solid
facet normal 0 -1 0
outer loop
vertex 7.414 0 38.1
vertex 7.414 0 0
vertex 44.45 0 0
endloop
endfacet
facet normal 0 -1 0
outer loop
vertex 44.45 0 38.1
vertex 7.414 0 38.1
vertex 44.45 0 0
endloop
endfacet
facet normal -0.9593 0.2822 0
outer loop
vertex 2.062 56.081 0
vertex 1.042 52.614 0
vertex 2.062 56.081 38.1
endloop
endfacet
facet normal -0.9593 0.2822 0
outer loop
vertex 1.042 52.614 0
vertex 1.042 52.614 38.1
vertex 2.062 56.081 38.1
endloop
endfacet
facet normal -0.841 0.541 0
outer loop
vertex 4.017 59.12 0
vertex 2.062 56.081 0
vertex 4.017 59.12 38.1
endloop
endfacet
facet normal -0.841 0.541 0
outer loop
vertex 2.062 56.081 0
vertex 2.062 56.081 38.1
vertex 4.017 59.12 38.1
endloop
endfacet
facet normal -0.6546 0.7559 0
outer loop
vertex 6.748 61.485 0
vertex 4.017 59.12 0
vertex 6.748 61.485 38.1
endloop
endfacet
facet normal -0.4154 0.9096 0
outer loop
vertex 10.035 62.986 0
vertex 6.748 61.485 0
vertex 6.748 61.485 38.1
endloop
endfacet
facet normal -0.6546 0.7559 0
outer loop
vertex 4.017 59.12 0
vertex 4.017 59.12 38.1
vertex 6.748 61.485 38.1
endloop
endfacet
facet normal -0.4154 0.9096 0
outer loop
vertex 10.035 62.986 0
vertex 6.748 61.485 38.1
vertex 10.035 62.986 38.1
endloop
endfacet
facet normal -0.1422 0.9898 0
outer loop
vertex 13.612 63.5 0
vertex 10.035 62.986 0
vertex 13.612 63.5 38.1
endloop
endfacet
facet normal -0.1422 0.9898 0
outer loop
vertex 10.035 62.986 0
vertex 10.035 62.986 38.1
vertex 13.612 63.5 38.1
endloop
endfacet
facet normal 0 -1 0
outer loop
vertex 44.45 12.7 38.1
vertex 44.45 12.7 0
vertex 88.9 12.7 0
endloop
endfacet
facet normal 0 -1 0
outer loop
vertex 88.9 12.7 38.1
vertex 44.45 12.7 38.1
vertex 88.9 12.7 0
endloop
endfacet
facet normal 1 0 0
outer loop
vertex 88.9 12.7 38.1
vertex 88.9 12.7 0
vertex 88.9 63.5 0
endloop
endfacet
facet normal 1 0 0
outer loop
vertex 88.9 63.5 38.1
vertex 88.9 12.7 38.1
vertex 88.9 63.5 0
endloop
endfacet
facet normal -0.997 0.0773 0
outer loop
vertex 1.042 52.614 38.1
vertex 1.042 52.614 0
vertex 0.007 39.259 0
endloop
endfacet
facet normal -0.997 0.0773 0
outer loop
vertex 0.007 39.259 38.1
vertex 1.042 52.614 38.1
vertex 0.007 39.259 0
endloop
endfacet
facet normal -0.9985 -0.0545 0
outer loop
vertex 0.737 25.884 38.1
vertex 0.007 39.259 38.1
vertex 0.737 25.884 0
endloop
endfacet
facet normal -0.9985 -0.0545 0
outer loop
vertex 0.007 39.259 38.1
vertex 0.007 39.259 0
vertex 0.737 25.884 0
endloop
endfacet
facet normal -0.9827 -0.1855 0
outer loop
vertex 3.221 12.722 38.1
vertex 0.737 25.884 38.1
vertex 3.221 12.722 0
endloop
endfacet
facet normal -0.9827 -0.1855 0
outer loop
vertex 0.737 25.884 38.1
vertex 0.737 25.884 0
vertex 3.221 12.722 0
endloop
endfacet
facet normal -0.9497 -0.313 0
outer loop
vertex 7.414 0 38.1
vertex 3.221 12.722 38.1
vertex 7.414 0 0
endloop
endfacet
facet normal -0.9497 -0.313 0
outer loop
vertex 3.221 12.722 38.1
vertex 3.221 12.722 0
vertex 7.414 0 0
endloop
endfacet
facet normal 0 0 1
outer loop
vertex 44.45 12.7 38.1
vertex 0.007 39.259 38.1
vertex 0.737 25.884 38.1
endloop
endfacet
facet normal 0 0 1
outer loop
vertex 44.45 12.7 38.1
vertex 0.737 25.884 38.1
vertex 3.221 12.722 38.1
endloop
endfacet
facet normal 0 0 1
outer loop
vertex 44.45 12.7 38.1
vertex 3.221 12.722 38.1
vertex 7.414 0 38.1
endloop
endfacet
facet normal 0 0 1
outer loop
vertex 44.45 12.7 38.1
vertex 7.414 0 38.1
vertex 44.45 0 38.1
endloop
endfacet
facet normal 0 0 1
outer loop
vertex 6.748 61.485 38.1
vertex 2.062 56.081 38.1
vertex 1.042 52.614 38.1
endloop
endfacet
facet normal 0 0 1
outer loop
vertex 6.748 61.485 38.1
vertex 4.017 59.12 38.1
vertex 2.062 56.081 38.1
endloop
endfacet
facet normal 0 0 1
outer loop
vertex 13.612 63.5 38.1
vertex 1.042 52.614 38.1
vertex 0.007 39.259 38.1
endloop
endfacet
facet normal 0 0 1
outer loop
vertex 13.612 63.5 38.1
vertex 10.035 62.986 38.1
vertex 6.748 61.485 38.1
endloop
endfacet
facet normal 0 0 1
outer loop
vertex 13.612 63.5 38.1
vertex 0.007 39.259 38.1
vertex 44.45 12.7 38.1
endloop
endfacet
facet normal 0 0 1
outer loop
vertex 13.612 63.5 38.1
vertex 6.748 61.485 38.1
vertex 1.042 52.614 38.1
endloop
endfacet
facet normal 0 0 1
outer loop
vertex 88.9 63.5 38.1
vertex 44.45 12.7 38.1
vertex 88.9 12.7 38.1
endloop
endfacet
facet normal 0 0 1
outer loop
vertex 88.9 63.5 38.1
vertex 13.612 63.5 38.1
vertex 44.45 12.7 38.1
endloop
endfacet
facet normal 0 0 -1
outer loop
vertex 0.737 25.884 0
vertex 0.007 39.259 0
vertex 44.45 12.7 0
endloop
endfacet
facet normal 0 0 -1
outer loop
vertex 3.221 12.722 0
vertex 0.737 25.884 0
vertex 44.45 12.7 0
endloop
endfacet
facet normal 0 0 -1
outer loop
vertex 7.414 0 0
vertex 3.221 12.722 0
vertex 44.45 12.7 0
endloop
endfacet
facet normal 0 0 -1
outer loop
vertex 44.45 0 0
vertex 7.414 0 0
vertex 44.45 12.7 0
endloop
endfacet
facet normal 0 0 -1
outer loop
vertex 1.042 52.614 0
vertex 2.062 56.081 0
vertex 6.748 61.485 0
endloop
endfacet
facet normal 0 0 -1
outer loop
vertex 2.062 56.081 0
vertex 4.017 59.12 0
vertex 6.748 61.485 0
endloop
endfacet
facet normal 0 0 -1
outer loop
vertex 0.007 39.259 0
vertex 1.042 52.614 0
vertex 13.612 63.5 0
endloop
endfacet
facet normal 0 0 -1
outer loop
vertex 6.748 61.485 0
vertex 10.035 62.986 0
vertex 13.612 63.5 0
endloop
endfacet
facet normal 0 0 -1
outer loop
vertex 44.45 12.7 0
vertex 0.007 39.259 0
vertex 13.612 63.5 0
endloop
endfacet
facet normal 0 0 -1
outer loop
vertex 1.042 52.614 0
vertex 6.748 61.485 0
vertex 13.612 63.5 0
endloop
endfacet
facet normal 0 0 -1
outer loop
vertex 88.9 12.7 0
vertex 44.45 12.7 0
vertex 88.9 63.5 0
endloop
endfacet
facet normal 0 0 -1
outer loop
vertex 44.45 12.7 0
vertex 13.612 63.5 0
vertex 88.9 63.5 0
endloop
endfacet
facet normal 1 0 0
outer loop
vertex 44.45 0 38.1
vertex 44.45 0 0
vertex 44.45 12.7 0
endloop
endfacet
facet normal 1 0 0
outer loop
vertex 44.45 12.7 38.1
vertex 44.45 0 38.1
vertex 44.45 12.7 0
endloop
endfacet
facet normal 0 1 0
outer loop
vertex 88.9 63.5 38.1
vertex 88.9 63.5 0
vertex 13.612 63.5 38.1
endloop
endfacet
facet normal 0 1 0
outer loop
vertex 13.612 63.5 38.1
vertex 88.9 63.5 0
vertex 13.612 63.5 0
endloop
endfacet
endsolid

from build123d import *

# Parameters (mm, degrees)
F1_DEPTH = 38.1
F2_R     = 12.7


with BuildPart() as f1:
    # F0 (on Top) → F1 (new body)
    with BuildSketch(Plane.XY):
        with BuildLine():
            ThreePointArc((3.226223, 63.5), (0.220256, 31.413637), (7.414279, 0))
            Line((7.414279, 0), (44.45, 0))
            Line((44.45, 0), (44.45, 12.7))
            Line((44.45, 12.7), (88.9, 12.7))
            Line((88.9, 12.7), (88.9, 63.5))
            Line((88.9, 63.5), (3.226223, 63.5))
        make_face()
    extrude(amount=F1_DEPTH)

    # F2
    f2_edges = [f1.edges().sort_by_distance(p)[0] for p in [
        (3.226223, 63.5, 19.05),
    ]]
    fillet(f2_edges, radius=F2_R)


solid = f1.part
